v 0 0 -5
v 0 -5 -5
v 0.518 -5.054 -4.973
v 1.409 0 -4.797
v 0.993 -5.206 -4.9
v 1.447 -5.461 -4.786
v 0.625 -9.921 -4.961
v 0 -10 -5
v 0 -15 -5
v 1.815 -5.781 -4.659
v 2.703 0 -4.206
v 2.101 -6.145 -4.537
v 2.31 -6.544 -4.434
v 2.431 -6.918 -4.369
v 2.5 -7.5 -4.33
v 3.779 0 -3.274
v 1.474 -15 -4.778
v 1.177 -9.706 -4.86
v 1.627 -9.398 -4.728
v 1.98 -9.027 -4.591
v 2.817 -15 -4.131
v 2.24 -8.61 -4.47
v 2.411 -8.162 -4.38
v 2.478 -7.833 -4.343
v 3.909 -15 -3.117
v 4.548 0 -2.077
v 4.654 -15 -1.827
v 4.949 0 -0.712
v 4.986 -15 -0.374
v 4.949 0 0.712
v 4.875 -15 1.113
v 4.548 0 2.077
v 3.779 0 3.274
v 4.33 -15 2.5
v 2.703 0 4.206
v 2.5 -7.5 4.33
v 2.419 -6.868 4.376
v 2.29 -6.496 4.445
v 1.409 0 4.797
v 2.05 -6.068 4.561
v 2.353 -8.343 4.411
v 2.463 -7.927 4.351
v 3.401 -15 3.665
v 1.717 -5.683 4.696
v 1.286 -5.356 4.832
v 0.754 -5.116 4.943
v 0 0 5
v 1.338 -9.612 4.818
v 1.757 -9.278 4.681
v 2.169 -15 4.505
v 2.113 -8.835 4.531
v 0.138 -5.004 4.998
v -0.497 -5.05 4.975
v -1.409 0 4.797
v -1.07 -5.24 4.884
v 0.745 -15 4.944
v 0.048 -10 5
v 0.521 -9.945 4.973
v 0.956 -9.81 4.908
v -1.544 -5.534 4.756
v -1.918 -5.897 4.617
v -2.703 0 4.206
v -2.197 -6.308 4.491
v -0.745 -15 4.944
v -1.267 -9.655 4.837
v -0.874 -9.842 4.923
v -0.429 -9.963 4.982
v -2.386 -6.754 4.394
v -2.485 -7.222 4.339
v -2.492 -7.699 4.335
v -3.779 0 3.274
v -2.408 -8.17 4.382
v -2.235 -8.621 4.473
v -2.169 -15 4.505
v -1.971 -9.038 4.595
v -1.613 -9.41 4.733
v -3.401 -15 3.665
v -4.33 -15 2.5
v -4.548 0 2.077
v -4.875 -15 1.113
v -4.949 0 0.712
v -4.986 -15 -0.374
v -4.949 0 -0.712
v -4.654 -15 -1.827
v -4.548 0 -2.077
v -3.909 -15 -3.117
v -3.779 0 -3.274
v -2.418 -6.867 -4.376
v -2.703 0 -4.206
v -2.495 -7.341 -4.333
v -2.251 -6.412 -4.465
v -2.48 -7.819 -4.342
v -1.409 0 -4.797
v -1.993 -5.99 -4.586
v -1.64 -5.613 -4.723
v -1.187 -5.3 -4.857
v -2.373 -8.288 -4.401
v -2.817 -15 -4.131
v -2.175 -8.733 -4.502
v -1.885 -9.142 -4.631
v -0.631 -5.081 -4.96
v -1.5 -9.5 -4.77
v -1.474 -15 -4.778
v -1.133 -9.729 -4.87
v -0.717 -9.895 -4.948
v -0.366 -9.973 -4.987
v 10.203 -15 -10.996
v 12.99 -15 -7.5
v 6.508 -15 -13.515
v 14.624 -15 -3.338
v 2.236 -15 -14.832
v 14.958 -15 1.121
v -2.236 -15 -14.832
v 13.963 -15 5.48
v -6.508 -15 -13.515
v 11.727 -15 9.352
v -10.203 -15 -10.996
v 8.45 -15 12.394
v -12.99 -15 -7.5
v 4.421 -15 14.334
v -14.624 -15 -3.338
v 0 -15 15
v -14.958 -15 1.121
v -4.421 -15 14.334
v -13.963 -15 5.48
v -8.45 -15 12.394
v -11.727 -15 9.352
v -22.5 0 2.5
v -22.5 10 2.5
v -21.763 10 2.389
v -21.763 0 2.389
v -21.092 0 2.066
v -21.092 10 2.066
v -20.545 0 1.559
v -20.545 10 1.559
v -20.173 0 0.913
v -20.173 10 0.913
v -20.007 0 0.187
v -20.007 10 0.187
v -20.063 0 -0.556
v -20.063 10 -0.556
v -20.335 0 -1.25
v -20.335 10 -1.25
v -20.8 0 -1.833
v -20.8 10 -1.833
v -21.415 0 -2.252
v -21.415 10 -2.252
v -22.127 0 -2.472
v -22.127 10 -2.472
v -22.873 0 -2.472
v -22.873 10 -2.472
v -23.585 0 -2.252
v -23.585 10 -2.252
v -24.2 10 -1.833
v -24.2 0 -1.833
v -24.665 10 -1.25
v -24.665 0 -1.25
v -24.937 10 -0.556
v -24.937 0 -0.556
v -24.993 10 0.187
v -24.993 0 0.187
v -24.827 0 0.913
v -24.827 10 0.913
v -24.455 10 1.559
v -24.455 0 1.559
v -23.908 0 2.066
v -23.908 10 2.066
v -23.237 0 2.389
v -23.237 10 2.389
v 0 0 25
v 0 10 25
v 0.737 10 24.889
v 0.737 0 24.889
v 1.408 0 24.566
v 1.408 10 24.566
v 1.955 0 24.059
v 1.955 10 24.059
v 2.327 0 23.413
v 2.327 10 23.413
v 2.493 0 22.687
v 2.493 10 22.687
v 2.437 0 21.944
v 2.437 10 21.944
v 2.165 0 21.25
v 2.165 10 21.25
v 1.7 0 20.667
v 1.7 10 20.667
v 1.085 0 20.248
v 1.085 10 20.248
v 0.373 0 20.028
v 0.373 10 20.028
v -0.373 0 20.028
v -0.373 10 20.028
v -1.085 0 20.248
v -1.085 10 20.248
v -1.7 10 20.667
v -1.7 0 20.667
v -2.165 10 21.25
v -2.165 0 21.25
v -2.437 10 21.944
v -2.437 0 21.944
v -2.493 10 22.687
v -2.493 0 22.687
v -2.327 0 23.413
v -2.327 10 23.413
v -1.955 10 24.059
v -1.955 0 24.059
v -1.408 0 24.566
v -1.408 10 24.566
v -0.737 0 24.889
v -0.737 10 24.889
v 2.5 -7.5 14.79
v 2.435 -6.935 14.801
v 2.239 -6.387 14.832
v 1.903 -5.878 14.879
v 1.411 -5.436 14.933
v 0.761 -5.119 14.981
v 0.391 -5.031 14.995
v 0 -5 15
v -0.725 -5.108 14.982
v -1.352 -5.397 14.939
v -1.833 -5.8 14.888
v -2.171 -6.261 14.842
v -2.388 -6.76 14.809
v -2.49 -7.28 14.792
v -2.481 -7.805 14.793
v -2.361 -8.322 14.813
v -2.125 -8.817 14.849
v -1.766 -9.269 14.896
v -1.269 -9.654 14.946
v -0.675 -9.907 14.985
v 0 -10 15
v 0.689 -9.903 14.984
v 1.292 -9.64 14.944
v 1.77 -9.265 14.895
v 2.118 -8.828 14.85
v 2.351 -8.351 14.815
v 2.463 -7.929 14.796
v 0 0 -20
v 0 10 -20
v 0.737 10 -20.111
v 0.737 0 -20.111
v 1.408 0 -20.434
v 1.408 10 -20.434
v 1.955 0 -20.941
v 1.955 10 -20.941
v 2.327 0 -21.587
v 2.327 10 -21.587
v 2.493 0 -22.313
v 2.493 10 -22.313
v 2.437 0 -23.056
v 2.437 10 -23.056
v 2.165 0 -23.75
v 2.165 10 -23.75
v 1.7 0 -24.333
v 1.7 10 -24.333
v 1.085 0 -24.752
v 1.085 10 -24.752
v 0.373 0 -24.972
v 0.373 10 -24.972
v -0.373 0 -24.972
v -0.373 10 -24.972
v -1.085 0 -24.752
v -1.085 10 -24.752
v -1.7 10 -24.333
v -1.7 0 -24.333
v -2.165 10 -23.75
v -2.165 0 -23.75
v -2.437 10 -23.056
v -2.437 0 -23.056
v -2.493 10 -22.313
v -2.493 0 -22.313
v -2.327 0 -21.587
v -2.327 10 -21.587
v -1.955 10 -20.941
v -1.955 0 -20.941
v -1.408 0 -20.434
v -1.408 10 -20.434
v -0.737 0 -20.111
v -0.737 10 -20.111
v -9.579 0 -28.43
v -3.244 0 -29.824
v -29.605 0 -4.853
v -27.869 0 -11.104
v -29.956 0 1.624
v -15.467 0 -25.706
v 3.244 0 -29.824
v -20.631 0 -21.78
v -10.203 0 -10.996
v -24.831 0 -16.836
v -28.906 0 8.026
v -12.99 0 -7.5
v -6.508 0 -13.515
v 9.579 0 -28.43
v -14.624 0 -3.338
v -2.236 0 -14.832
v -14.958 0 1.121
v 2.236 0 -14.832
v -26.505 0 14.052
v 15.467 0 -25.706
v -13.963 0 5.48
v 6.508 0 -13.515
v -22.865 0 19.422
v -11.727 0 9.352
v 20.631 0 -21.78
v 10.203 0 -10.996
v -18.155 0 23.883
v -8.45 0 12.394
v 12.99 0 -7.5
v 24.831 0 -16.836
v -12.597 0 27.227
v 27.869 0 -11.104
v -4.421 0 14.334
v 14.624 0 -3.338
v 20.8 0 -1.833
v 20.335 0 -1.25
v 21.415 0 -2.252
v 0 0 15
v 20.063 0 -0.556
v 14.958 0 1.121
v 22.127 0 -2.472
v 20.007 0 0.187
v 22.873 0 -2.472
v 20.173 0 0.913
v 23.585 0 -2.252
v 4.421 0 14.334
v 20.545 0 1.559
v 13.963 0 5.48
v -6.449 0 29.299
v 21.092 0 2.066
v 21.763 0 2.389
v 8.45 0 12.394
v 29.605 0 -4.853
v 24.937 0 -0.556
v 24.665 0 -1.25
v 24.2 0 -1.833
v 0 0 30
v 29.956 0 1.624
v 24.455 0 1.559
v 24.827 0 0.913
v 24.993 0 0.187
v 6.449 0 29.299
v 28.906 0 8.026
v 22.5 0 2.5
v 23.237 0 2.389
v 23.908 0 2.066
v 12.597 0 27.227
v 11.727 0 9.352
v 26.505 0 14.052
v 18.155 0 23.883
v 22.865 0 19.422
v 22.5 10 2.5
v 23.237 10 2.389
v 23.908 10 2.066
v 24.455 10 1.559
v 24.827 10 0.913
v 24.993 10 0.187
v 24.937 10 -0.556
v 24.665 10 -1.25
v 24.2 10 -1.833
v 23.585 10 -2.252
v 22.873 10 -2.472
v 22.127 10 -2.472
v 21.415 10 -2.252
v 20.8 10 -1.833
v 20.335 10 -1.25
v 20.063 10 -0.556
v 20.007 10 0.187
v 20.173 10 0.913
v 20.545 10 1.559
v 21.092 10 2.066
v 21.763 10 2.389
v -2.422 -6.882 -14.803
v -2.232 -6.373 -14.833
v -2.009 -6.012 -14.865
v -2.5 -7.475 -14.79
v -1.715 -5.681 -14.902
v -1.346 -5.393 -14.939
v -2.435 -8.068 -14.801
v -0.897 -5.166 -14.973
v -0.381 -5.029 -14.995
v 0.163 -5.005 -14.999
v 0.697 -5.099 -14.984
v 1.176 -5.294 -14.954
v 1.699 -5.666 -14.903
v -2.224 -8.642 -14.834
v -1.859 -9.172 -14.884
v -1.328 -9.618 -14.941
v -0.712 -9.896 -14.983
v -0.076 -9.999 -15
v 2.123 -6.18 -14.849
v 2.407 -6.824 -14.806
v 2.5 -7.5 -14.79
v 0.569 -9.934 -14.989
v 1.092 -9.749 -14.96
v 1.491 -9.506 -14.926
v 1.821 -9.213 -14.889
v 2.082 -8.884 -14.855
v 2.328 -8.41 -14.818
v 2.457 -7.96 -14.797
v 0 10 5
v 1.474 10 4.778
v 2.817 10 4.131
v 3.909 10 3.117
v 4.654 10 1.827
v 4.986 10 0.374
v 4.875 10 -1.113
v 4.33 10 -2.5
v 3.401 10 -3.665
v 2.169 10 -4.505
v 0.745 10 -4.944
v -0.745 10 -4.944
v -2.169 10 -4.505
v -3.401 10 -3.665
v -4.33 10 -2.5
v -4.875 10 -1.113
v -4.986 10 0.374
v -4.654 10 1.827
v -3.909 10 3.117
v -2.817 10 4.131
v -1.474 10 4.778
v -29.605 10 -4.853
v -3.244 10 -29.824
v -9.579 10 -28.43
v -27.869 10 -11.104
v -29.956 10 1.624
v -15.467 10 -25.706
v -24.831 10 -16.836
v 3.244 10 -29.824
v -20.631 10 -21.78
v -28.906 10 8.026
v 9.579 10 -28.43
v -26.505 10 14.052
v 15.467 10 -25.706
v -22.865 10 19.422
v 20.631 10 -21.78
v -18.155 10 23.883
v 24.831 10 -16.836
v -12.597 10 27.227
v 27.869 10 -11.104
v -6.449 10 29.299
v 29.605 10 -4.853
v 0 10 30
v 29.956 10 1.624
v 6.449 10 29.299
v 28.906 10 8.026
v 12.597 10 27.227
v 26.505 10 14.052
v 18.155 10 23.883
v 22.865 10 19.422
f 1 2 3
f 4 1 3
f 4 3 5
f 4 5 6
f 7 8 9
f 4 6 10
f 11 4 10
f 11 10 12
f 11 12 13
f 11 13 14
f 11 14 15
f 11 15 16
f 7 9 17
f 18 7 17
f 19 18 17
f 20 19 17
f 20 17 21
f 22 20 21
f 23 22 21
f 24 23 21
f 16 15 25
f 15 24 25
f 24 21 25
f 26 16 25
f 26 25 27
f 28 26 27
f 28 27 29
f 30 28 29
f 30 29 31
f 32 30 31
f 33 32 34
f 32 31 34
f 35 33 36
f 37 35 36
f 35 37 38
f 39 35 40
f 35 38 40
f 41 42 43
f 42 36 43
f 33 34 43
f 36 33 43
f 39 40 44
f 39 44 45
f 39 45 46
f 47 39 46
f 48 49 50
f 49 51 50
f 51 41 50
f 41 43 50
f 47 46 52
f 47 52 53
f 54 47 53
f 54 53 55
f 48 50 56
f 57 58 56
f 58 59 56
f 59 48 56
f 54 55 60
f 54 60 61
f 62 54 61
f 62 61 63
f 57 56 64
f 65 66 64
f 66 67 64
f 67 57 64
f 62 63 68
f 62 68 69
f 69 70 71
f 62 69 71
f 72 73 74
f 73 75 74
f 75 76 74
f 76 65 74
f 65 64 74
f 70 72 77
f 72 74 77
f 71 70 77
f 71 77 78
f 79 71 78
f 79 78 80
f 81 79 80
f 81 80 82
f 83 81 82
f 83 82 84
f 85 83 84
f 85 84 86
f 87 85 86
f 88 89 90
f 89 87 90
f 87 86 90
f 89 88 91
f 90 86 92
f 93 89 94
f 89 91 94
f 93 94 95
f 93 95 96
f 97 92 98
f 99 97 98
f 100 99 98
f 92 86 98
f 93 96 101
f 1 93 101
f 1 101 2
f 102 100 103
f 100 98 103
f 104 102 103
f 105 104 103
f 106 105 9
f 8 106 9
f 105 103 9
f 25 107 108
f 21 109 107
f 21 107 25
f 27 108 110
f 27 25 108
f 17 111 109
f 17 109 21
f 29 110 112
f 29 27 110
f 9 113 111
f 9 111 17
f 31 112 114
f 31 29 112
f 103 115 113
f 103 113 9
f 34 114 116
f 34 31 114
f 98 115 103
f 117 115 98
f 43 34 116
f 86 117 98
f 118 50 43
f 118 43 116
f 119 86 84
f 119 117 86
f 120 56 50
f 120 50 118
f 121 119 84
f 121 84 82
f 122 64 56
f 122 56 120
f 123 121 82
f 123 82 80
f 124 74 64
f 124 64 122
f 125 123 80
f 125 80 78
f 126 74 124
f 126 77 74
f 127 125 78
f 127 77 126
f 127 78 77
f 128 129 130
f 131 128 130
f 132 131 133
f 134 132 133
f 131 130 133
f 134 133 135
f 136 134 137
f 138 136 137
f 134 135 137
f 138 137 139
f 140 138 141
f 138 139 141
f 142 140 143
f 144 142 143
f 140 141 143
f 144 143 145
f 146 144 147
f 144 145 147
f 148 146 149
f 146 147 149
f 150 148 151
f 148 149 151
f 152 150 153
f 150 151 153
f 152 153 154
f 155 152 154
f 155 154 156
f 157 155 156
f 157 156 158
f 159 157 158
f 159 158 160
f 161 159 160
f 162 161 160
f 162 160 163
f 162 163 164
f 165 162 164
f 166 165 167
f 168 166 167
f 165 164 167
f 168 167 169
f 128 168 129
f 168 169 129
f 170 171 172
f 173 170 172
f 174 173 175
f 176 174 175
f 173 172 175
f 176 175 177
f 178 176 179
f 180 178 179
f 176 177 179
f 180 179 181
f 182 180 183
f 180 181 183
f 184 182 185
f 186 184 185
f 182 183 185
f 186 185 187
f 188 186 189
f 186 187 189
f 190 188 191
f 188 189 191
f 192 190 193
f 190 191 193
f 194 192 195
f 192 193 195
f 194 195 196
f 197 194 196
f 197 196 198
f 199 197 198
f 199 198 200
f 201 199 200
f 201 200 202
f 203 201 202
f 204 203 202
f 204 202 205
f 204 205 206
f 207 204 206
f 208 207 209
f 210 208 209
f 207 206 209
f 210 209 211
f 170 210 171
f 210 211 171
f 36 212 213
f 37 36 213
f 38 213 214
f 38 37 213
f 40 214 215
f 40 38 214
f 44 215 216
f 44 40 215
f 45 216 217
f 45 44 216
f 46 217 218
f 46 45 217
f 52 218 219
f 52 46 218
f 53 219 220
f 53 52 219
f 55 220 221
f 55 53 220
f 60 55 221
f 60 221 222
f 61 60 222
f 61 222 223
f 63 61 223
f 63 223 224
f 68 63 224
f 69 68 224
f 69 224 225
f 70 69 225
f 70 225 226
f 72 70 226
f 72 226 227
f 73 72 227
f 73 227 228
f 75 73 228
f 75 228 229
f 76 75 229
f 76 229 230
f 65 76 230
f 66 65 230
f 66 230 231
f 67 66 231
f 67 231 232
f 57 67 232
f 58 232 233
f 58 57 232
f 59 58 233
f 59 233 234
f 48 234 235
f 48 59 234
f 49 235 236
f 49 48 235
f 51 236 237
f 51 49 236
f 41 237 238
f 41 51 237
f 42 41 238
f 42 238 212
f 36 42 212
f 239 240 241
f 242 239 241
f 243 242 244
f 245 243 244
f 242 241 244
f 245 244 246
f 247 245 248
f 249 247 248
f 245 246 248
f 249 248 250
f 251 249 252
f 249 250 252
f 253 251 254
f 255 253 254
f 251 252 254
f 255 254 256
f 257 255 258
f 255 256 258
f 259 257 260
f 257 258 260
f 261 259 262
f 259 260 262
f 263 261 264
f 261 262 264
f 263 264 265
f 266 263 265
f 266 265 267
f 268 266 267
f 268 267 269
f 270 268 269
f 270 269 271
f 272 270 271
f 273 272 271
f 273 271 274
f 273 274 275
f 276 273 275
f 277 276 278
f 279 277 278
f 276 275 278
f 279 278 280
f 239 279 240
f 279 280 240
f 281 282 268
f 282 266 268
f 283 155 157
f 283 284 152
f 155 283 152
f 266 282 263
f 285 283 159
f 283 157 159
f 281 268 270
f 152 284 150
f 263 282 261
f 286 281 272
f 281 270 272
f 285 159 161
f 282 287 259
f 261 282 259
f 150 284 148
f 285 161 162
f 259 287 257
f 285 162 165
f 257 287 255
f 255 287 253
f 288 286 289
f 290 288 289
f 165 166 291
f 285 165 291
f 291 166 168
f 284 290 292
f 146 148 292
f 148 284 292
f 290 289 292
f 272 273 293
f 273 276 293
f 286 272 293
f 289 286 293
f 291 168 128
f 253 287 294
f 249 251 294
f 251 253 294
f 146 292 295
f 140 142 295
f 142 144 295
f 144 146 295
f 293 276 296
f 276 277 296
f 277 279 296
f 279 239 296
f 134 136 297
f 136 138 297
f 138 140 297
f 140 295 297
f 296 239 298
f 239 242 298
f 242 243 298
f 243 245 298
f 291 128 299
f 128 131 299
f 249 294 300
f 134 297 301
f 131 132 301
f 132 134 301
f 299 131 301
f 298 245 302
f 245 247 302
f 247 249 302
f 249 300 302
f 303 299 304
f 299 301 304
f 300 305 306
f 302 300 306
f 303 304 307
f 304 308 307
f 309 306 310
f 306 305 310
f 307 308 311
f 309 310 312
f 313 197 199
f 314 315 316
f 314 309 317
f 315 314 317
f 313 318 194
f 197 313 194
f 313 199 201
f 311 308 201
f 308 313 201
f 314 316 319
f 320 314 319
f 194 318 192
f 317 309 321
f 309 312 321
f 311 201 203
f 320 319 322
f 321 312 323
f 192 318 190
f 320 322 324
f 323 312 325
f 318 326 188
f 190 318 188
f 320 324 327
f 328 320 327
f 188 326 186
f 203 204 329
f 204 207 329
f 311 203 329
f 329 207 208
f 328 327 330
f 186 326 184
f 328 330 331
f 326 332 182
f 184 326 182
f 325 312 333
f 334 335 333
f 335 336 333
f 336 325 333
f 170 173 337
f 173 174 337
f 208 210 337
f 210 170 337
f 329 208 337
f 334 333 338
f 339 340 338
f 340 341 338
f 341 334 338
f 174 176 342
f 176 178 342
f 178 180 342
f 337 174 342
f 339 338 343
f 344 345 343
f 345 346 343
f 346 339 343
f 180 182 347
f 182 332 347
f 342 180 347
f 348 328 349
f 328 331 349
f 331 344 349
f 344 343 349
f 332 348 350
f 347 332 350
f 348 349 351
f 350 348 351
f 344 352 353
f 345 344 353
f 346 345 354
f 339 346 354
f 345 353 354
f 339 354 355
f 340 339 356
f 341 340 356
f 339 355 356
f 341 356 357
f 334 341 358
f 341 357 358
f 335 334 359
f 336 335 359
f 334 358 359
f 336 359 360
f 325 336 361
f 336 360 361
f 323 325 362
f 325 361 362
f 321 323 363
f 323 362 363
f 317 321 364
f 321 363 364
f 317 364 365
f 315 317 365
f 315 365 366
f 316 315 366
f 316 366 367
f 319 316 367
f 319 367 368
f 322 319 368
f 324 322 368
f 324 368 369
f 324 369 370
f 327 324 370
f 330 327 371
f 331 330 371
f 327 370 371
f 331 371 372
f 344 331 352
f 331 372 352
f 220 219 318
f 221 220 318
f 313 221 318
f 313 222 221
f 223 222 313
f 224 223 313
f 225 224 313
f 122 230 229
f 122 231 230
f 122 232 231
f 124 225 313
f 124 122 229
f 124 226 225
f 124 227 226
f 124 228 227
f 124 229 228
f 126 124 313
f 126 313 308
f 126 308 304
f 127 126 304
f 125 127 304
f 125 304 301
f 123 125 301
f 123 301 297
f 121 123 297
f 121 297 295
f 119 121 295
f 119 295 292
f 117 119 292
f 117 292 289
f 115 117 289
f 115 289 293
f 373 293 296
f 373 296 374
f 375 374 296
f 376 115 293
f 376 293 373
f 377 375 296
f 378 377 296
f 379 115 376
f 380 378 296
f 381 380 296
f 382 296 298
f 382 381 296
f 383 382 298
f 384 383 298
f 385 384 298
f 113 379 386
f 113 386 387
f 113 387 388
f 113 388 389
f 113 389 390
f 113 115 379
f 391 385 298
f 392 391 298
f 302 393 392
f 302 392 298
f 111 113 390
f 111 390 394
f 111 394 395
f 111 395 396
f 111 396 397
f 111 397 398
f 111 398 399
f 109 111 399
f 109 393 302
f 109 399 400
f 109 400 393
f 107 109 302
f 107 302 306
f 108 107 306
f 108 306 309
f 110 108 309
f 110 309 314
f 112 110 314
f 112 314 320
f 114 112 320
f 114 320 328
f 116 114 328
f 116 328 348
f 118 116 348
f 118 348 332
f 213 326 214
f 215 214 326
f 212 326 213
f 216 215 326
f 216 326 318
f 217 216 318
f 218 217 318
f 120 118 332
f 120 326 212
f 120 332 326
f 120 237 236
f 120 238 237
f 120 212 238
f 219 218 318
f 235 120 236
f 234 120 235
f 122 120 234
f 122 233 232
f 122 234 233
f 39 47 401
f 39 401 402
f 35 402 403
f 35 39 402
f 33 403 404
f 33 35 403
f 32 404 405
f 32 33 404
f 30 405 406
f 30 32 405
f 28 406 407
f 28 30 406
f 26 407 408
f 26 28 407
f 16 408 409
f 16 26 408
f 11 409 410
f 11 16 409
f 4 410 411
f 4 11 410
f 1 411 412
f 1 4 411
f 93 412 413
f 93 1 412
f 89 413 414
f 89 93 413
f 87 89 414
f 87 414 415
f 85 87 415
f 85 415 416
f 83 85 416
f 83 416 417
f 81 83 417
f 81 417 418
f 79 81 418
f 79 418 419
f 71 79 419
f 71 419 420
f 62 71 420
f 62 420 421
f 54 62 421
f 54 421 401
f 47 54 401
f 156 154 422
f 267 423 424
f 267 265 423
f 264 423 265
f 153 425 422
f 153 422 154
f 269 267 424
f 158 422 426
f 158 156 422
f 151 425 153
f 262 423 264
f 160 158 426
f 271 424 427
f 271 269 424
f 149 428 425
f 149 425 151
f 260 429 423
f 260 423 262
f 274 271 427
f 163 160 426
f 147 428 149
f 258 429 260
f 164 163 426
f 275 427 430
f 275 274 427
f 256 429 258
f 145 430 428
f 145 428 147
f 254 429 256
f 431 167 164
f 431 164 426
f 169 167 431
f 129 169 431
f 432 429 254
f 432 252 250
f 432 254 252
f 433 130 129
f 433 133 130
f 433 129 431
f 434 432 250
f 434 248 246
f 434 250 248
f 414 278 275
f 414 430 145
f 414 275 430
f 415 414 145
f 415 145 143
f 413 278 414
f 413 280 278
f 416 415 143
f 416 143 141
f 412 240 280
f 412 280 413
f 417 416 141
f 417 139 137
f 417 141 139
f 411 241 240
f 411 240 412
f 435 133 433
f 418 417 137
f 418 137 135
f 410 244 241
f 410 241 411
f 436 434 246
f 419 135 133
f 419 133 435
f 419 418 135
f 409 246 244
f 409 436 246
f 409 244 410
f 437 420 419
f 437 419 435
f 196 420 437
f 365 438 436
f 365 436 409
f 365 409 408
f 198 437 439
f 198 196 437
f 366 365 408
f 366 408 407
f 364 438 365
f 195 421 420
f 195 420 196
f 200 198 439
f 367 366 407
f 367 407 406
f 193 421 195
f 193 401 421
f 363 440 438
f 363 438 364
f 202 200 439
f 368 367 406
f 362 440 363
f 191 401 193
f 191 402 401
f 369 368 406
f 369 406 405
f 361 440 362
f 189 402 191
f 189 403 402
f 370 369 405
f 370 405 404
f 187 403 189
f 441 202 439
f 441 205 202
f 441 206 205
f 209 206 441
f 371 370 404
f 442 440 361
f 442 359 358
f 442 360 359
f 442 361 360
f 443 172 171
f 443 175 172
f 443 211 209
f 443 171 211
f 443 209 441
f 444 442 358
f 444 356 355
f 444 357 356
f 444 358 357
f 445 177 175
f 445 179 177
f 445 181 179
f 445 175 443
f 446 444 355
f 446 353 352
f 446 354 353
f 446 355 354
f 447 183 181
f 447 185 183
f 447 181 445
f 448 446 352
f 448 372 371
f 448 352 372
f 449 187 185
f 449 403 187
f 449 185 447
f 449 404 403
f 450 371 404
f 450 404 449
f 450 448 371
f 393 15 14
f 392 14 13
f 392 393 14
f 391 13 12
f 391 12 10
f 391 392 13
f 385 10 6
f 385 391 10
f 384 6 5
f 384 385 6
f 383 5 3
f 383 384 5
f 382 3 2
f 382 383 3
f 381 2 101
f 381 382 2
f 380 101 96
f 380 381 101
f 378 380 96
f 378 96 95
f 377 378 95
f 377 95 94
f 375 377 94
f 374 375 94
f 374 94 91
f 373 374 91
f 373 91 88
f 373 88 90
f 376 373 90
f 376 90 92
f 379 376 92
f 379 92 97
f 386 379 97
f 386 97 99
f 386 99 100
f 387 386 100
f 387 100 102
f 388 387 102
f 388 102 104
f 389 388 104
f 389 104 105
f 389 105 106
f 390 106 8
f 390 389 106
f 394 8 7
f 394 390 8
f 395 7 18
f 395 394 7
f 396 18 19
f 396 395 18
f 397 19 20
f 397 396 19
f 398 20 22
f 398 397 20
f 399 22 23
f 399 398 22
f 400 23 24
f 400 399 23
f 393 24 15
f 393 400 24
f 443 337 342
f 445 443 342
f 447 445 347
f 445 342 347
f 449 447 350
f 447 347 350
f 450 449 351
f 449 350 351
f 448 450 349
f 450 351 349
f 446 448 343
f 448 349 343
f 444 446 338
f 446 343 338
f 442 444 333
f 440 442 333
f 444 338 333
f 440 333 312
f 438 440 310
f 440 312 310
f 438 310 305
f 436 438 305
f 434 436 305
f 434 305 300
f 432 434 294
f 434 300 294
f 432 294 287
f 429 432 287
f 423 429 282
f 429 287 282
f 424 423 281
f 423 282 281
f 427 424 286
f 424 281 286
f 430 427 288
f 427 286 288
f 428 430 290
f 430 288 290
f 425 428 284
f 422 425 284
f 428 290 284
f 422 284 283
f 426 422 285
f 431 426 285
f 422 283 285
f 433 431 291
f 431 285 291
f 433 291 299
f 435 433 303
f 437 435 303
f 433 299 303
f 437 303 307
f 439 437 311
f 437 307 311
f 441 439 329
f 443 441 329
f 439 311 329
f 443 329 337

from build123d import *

# Parameters (mm, degrees)
SKETCH1_R               = 30
SKETCH1_R_2             = 5
BOSS_EXTRUDE4_DEPTH     = 10
SKETCH2_R               = 2.5
CUT_EXTRUDE1_DEPTH      = 10
BOSS_EXTRUDE5_START     = 15
SKETCH3_R               = 15
SKETCH3_R_2             = 5
BOSS_EXTRUDE5_DEPTH     = 15
CUT_EXTRUDE2_DEPTH      = 54
CUT_EXTRUDE2_DEPTH_BACK = 39
SKETCH4_R               = 2.5


with BuildPart() as part:
    # Sketch1 → Boss-Extrude4 (new body)
    with BuildSketch(Plane(origin=(0, 0, 0), x_dir=(1, 0, 0), z_dir=(0, 1, 0))):
        Circle(SKETCH1_R)
        Circle(SKETCH1_R_2, mode=Mode.SUBTRACT)
    extrude(amount=BOSS_EXTRUDE4_DEPTH)

    # Sketch2 → Cut-Extrude1 (cut)
    with BuildSketch(Plane(origin=(0, 10, 0), x_dir=(1, 0, 0), z_dir=(0, 1, 0))):
        with Locations((0, 22.5)):
            Circle(SKETCH2_R)
        with Locations((22.5, 0)):
            Circle(SKETCH2_R)
        with Locations((0, -22.5)):
            Circle(SKETCH2_R)
        with Locations((-22.5, 0)):
            Circle(SKETCH2_R)
    extrude(amount=-CUT_EXTRUDE1_DEPTH, mode=Mode.SUBTRACT)

    # Sketch3 → Boss-Extrude5 (add)
    with BuildSketch(Plane.XZ.offset(BOSS_EXTRUDE5_START)):
        Circle(SKETCH3_R)
        Circle(SKETCH3_R_2, mode=Mode.SUBTRACT)
    extrude(amount=-BOSS_EXTRUDE5_DEPTH)

    # Sketch4 → Cut-Extrude2 (cut, two sides: drawn at the far end of the back side and taken through both)
    with BuildSketch(Plane.XY.offset(-CUT_EXTRUDE2_DEPTH_BACK)):
        with Locations((0, -7.5)):
            Circle(SKETCH4_R)
    extrude(amount=CUT_EXTRUDE2_DEPTH + CUT_EXTRUDE2_DEPTH_BACK, mode=Mode.SUBTRACT)


solid = part.part
